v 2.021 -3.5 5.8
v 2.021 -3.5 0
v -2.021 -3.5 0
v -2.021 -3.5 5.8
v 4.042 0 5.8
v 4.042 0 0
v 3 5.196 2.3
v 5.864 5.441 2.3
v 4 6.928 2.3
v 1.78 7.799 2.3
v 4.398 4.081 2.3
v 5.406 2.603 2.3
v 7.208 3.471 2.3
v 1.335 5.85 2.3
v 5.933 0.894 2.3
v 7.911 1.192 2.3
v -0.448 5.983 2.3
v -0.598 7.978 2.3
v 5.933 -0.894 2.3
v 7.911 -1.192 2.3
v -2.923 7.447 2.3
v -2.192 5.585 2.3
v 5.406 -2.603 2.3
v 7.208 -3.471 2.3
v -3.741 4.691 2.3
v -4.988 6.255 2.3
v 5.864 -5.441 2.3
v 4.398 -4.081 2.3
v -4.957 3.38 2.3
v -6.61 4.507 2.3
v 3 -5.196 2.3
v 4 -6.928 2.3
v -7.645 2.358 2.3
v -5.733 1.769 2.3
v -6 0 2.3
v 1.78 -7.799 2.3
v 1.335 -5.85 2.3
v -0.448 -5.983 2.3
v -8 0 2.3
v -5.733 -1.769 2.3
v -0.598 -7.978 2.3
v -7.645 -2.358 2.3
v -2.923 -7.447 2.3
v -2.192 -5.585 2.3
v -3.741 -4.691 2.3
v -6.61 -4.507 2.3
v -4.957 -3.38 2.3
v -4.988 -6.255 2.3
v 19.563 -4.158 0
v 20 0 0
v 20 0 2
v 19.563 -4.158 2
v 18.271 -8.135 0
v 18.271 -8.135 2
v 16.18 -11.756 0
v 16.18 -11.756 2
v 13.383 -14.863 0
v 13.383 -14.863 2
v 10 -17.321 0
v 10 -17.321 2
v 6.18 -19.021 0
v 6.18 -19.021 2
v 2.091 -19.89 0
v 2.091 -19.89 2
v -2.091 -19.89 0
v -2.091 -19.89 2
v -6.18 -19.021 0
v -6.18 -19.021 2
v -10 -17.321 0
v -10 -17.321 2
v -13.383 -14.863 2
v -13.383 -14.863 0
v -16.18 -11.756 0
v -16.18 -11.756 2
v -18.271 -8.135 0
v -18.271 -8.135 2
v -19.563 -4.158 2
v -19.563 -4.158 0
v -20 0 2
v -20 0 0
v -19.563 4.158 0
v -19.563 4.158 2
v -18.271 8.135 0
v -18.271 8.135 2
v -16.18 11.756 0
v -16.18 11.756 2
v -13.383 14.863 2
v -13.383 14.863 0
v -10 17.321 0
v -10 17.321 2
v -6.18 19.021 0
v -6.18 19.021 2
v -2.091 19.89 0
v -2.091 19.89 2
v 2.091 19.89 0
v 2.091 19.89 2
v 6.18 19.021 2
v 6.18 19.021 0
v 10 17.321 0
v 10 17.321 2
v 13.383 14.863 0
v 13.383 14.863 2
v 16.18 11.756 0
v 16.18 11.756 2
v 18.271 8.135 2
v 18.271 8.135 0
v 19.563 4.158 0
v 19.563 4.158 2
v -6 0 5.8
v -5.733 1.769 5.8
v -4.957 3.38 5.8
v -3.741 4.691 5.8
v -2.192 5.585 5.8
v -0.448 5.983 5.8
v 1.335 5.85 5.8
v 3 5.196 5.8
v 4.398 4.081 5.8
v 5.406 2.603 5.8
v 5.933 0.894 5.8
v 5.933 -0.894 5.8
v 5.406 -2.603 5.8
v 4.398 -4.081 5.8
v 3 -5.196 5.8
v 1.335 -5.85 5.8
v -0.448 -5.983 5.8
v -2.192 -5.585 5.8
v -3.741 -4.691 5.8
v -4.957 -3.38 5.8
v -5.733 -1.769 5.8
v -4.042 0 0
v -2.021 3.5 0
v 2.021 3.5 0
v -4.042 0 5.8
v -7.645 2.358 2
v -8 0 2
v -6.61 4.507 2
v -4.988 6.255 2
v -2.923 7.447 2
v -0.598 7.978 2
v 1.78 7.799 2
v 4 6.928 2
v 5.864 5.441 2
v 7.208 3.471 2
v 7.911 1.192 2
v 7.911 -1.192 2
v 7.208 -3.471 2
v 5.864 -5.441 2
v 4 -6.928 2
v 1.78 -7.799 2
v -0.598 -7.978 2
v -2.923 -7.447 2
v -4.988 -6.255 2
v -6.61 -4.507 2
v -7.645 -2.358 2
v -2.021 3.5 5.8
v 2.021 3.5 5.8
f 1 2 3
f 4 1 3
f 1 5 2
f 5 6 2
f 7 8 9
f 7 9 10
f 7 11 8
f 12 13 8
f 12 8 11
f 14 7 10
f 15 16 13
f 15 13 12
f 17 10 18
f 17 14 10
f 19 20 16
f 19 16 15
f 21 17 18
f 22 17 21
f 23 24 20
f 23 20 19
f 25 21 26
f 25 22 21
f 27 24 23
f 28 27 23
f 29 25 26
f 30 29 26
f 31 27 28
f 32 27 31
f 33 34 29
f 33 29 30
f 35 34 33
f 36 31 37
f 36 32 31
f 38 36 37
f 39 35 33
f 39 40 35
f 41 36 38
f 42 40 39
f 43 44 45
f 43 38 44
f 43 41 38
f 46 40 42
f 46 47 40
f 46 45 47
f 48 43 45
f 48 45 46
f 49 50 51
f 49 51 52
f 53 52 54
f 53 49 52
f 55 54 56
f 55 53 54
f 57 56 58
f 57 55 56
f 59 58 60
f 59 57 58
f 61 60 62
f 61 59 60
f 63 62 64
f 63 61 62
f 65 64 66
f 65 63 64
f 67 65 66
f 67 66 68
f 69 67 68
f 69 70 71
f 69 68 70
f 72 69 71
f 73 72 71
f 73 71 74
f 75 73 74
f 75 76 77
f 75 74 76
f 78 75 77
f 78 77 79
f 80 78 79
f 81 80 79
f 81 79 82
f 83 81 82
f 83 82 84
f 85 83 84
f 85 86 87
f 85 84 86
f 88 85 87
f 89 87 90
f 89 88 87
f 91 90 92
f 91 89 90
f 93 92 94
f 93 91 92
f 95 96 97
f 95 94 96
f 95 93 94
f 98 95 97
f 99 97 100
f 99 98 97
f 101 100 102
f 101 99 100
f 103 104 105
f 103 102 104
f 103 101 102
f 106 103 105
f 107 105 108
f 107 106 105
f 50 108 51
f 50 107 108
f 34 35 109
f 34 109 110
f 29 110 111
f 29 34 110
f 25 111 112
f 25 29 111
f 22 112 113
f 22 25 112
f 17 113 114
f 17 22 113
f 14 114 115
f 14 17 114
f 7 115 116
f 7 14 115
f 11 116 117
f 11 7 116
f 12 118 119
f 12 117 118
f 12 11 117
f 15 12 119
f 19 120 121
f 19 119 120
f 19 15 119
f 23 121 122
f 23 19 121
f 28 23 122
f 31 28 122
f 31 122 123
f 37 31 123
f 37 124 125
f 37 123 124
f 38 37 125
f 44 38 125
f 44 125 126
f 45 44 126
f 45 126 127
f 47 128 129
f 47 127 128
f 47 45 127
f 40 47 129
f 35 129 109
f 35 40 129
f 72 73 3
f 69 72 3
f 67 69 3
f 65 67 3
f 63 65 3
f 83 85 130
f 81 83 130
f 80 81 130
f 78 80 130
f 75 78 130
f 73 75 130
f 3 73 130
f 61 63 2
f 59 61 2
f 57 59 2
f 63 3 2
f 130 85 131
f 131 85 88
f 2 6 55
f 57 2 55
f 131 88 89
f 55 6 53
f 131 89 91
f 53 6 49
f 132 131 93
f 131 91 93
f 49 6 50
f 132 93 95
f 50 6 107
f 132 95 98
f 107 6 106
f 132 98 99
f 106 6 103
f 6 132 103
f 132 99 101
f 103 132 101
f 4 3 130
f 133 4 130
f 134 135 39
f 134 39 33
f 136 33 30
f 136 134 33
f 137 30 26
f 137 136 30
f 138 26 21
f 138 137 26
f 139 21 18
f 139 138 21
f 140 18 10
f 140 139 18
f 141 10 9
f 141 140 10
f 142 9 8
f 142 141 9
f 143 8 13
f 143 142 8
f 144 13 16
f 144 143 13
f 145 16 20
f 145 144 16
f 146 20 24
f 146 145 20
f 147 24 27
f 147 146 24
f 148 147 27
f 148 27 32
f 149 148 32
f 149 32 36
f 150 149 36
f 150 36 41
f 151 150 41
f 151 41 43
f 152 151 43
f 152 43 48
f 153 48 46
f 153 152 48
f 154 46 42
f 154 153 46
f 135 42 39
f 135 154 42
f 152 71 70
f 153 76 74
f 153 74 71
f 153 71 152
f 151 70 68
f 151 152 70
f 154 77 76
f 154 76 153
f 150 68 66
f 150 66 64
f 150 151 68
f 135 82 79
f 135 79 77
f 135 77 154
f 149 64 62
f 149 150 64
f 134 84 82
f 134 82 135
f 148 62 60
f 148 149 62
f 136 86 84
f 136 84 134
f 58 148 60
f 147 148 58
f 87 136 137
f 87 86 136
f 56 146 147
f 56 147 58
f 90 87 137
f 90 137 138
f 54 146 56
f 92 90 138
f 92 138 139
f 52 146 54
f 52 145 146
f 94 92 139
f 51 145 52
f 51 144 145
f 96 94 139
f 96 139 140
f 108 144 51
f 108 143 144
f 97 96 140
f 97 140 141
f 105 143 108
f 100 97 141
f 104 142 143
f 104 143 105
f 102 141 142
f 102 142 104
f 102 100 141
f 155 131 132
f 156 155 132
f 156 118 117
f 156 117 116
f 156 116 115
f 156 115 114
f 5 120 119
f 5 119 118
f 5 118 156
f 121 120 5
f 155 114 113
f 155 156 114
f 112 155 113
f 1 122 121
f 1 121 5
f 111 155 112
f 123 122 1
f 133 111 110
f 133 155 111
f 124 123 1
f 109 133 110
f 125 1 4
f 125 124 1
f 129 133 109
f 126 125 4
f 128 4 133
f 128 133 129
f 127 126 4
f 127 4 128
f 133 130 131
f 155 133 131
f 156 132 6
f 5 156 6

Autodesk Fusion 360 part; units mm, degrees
sketch "Sketch1" plane through (0, 0, 0) normal (0, 0, 1) x (1, 0, 0)
  circle A0 centre (0, 0) radius 20
  line L0 (4.0415, 0) -> (2.0207, 3.5)
  line L1 (2.0207, 3.5) -> (-2.0207, 3.5)
  line L2 (-2.0207, 3.5) -> (-4.0415, 0)
  line L3 (-4.0415, 0) -> (-2.0207, -3.5)
  line L4 (-2.0207, -3.5) -> (2.0207, -3.5)
  line L5 (2.0207, -3.5) -> (4.0415, 0)
  dimension "d1" = 40
  dimension "d10" = 7
extrude "Extrude1" add sketch "Sketch1" along normal blind 2
sketch "Sketch2" plane through (0, 0, 2) normal (0, 0, 1) x (-1, 0, 0)
  circle A0 centre (0, 0) radius 20
  circle A1 centre (0, 0) radius 8
  line L0 (-4.0415, 0) -> (-2.0207, 3.5)
  line L1 (-2.0207, 3.5) -> (2.0207, 3.5)
  line L2 (2.0207, 3.5) -> (4.0415, 0)
  line L3 (4.0415, 0) -> (2.0207, -3.5)
  line L4 (2.0207, -3.5) -> (-2.0207, -3.5)
  line L5 (-2.0207, -3.5) -> (-4.0415, 0)
  dimension "d4" = 16
extrude "Extrude2" add sketch "Sketch2" along normal blind 0.3 contours A1
sketch "Sketch3" plane through (0, 0, 2.3) normal (0, 0, 1) x (-1, 0, 0)
  circle A0 centre (0, 0) radius 8
  circle A1 centre (0, 0) radius 6
  line L0 (2.0207, -3.5) -> (-2.0207, -3.5)
  line L1 (-2.0207, -3.5) -> (-4.0415, 0)
  line L2 (-4.0415, 0) -> (-2.0207, 3.5)
  line L3 (-2.0207, 3.5) -> (2.0207, 3.5)
  line L4 (2.0207, 3.5) -> (4.0415, 0)
  line L5 (4.0415, 0) -> (2.0207, -3.5)
  dimension "d7" = 12
extrude "Extrude3" add sketch "Sketch3" along normal blind 3.5 contours A1
